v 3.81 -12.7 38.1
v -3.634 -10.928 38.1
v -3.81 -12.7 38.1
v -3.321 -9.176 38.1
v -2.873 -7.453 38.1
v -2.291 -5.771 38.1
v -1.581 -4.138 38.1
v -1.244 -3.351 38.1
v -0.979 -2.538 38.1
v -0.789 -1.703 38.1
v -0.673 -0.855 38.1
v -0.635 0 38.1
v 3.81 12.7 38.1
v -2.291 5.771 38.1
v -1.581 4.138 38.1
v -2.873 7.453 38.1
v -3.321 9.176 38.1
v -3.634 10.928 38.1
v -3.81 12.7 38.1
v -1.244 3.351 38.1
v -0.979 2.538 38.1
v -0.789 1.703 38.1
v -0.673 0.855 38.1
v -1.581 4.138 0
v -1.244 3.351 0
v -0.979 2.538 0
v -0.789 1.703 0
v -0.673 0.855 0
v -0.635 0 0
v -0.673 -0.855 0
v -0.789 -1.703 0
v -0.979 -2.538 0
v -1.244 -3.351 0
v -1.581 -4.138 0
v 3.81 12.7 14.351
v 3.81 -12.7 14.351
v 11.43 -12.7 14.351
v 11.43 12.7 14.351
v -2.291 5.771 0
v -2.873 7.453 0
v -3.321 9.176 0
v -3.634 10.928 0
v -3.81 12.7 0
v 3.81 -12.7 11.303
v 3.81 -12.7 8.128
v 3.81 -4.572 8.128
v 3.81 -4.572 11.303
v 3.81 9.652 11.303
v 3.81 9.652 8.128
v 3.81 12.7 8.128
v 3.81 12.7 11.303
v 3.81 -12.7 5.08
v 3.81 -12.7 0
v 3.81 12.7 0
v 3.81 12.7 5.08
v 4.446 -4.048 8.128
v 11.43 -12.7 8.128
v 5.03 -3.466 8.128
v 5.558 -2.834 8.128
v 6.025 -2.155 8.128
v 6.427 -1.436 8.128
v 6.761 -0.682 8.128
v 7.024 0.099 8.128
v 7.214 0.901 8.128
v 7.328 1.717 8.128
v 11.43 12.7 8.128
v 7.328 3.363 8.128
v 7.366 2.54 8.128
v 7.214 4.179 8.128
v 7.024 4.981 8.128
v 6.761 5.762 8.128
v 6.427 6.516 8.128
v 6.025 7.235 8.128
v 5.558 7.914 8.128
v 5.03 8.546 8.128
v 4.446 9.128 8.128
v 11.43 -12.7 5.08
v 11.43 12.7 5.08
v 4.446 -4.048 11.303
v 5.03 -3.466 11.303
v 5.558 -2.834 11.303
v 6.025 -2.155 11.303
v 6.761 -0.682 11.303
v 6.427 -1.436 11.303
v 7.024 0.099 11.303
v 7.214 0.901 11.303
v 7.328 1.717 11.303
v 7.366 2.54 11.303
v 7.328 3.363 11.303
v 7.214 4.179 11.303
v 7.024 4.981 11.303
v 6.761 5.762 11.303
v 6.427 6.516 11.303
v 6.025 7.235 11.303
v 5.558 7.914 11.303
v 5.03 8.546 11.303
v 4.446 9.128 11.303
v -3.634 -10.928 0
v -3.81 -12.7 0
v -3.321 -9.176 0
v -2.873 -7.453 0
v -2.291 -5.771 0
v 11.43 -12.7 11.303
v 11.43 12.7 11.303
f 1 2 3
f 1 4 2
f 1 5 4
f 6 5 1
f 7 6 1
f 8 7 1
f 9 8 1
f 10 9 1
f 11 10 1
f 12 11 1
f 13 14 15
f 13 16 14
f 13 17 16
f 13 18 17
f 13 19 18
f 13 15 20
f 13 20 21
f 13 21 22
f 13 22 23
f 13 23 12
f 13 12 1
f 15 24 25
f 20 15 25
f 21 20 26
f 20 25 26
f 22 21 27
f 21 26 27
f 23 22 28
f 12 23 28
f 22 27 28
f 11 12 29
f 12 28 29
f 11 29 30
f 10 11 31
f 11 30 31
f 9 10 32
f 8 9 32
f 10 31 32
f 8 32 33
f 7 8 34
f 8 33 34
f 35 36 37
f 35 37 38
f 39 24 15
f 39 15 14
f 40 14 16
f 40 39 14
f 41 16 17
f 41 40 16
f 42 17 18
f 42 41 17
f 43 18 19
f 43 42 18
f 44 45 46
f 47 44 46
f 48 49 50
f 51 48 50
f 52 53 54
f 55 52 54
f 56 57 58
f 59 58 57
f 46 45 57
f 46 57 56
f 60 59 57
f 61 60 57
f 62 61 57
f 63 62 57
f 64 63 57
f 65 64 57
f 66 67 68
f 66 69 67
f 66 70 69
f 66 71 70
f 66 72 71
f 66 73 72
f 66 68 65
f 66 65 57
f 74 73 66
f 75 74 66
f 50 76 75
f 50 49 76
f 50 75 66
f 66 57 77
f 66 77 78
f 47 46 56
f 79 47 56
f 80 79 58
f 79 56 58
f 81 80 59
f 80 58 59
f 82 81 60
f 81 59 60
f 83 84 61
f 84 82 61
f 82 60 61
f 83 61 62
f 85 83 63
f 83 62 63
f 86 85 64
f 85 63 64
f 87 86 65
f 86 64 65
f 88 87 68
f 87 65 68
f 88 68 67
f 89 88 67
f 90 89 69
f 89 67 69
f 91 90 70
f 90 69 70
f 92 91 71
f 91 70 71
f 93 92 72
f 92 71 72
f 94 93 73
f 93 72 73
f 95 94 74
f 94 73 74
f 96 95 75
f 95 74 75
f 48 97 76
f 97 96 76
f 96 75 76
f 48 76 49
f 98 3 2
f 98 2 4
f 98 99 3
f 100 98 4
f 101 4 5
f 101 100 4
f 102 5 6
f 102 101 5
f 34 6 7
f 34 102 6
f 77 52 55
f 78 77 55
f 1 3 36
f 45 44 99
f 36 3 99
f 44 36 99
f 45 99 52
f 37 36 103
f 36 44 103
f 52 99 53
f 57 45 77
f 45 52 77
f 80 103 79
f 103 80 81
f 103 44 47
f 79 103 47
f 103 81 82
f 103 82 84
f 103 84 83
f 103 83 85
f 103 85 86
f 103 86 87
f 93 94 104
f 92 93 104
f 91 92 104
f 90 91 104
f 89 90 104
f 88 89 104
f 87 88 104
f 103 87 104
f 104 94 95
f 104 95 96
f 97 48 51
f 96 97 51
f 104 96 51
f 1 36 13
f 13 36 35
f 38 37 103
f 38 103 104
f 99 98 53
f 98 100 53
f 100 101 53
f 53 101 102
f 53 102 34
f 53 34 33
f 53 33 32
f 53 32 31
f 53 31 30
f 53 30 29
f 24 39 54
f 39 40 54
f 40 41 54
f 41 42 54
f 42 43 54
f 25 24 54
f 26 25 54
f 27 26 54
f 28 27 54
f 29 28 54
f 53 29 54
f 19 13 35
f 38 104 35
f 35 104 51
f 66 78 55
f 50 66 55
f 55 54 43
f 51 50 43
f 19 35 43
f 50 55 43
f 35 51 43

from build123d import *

# Parameters (mm, degrees)
F1_DEPTH    = 25.4
F2_T1_DEPTH = 53.4024208572
F3_DEPTH    = 10.16
F4_DEPTH    = 2.54
F5_W        = 25.4
F5_H        = 3.048
F6_DEPTH    = 7.62
F8_DEPTH    = 5.08


# Not quite as in the source:
# - a fillet or chamfer that OpenCascade refuses, or shapes differently, is made with other operations: its cross-section is extruded or revolved along the edge and cut away or added


with BuildPart() as f1:
    # F0 (on Top) → F1 (new body)
    with BuildSketch(Plane.XY):
        with BuildLine():
            Line((-3.81, -12.7), (3.81, -12.7))
            Line((3.81, -12.7), (3.81, 12.7))
            Line((3.81, 12.7), (-3.81, 12.7))
            Line((-3.81, 12.7), (-3.81, 7.0995158286))
            ThreePointArc((-3.81, 7.0995158286), (-1.4649043996, 3.8885649667), (-0.635, 0))
            ThreePointArc((-0.635, 0), (-1.4649043996, -3.8885649667), (-3.81, -7.0995158286))
            Line((-3.81, -7.0995158286), (-3.81, -12.7))
        make_face()
    extrude(amount=F1_DEPTH)

    # F2: fillet of radius 22.86 on 2 edges, made by hand

    # F2_s2 → F2_t1 (cut)
    with BuildSketch(Plane.XY.offset(-14.0012104286)):
        with BuildLine():
            ThreePointArc((-3.81, 12.7), (-3.1136000163, 8.3102394823), (-1.5809070588, 4.1382108824))
            ThreePointArc((-1.5809070588, 4.1382108824), (-2.5500206467, 5.7283365162), (-3.81, 7.0995158286))
            Line((-3.81, 7.0995158286), (-3.81, 12.7))
        make_face()
        with BuildLine():
            ThreePointArc((-3.81, -12.7), (-3.1136000163, -8.3102394823), (-1.5809070588, -4.1382108824))
            ThreePointArc((-1.5809070588, -4.1382108824), (-2.5500206467, -5.7283365162), (-3.81, -7.0995158286))
            Line((-3.81, -7.0995158286), (-3.81, -12.7))
        make_face()
    extrude(amount=F2_T1_DEPTH, mode=Mode.SUBTRACT)

    # F3 (add): a face of the model
    f3_faces = [f1.faces().sort_by_distance(p)[0] for p in [
        (0.6414875327, 0, 25.4),
    ]]
    extrude(f3_faces, amount=F3_DEPTH)

    # F4 (add): a face of the model
    f4_faces = [f1.faces().sort_by_distance(p)[0] for p in [
        (0.6414875327, 0, 35.56),
    ]]
    extrude(f4_faces, amount=F4_DEPTH)

    # F5 (on face) → F6 (join)
    with BuildSketch(Plane.YZ.offset(3.81)):
        with Locations((0, 12.827)):
            Rectangle(F5_W, F5_H)
        with Locations((0, 6.604)):
            Rectangle(F5_W, F5_H)
    extrude(amount=F6_DEPTH)

    # F7 (on face) → F8 (join)
    with BuildSketch(Plane.XY.offset(8.128)):
        with BuildLine():
            ThreePointArc((3.81, -4.572), (6.427457728, -1.435728864), (7.366, 2.54))
            ThreePointArc((7.366, 2.54), (6.427457728, 6.515728864), (3.81, 9.652))
            Line((3.81, 9.652), (3.81, -4.572))
        make_face()
    extrude(amount=F8_DEPTH)


solid = f1.part
